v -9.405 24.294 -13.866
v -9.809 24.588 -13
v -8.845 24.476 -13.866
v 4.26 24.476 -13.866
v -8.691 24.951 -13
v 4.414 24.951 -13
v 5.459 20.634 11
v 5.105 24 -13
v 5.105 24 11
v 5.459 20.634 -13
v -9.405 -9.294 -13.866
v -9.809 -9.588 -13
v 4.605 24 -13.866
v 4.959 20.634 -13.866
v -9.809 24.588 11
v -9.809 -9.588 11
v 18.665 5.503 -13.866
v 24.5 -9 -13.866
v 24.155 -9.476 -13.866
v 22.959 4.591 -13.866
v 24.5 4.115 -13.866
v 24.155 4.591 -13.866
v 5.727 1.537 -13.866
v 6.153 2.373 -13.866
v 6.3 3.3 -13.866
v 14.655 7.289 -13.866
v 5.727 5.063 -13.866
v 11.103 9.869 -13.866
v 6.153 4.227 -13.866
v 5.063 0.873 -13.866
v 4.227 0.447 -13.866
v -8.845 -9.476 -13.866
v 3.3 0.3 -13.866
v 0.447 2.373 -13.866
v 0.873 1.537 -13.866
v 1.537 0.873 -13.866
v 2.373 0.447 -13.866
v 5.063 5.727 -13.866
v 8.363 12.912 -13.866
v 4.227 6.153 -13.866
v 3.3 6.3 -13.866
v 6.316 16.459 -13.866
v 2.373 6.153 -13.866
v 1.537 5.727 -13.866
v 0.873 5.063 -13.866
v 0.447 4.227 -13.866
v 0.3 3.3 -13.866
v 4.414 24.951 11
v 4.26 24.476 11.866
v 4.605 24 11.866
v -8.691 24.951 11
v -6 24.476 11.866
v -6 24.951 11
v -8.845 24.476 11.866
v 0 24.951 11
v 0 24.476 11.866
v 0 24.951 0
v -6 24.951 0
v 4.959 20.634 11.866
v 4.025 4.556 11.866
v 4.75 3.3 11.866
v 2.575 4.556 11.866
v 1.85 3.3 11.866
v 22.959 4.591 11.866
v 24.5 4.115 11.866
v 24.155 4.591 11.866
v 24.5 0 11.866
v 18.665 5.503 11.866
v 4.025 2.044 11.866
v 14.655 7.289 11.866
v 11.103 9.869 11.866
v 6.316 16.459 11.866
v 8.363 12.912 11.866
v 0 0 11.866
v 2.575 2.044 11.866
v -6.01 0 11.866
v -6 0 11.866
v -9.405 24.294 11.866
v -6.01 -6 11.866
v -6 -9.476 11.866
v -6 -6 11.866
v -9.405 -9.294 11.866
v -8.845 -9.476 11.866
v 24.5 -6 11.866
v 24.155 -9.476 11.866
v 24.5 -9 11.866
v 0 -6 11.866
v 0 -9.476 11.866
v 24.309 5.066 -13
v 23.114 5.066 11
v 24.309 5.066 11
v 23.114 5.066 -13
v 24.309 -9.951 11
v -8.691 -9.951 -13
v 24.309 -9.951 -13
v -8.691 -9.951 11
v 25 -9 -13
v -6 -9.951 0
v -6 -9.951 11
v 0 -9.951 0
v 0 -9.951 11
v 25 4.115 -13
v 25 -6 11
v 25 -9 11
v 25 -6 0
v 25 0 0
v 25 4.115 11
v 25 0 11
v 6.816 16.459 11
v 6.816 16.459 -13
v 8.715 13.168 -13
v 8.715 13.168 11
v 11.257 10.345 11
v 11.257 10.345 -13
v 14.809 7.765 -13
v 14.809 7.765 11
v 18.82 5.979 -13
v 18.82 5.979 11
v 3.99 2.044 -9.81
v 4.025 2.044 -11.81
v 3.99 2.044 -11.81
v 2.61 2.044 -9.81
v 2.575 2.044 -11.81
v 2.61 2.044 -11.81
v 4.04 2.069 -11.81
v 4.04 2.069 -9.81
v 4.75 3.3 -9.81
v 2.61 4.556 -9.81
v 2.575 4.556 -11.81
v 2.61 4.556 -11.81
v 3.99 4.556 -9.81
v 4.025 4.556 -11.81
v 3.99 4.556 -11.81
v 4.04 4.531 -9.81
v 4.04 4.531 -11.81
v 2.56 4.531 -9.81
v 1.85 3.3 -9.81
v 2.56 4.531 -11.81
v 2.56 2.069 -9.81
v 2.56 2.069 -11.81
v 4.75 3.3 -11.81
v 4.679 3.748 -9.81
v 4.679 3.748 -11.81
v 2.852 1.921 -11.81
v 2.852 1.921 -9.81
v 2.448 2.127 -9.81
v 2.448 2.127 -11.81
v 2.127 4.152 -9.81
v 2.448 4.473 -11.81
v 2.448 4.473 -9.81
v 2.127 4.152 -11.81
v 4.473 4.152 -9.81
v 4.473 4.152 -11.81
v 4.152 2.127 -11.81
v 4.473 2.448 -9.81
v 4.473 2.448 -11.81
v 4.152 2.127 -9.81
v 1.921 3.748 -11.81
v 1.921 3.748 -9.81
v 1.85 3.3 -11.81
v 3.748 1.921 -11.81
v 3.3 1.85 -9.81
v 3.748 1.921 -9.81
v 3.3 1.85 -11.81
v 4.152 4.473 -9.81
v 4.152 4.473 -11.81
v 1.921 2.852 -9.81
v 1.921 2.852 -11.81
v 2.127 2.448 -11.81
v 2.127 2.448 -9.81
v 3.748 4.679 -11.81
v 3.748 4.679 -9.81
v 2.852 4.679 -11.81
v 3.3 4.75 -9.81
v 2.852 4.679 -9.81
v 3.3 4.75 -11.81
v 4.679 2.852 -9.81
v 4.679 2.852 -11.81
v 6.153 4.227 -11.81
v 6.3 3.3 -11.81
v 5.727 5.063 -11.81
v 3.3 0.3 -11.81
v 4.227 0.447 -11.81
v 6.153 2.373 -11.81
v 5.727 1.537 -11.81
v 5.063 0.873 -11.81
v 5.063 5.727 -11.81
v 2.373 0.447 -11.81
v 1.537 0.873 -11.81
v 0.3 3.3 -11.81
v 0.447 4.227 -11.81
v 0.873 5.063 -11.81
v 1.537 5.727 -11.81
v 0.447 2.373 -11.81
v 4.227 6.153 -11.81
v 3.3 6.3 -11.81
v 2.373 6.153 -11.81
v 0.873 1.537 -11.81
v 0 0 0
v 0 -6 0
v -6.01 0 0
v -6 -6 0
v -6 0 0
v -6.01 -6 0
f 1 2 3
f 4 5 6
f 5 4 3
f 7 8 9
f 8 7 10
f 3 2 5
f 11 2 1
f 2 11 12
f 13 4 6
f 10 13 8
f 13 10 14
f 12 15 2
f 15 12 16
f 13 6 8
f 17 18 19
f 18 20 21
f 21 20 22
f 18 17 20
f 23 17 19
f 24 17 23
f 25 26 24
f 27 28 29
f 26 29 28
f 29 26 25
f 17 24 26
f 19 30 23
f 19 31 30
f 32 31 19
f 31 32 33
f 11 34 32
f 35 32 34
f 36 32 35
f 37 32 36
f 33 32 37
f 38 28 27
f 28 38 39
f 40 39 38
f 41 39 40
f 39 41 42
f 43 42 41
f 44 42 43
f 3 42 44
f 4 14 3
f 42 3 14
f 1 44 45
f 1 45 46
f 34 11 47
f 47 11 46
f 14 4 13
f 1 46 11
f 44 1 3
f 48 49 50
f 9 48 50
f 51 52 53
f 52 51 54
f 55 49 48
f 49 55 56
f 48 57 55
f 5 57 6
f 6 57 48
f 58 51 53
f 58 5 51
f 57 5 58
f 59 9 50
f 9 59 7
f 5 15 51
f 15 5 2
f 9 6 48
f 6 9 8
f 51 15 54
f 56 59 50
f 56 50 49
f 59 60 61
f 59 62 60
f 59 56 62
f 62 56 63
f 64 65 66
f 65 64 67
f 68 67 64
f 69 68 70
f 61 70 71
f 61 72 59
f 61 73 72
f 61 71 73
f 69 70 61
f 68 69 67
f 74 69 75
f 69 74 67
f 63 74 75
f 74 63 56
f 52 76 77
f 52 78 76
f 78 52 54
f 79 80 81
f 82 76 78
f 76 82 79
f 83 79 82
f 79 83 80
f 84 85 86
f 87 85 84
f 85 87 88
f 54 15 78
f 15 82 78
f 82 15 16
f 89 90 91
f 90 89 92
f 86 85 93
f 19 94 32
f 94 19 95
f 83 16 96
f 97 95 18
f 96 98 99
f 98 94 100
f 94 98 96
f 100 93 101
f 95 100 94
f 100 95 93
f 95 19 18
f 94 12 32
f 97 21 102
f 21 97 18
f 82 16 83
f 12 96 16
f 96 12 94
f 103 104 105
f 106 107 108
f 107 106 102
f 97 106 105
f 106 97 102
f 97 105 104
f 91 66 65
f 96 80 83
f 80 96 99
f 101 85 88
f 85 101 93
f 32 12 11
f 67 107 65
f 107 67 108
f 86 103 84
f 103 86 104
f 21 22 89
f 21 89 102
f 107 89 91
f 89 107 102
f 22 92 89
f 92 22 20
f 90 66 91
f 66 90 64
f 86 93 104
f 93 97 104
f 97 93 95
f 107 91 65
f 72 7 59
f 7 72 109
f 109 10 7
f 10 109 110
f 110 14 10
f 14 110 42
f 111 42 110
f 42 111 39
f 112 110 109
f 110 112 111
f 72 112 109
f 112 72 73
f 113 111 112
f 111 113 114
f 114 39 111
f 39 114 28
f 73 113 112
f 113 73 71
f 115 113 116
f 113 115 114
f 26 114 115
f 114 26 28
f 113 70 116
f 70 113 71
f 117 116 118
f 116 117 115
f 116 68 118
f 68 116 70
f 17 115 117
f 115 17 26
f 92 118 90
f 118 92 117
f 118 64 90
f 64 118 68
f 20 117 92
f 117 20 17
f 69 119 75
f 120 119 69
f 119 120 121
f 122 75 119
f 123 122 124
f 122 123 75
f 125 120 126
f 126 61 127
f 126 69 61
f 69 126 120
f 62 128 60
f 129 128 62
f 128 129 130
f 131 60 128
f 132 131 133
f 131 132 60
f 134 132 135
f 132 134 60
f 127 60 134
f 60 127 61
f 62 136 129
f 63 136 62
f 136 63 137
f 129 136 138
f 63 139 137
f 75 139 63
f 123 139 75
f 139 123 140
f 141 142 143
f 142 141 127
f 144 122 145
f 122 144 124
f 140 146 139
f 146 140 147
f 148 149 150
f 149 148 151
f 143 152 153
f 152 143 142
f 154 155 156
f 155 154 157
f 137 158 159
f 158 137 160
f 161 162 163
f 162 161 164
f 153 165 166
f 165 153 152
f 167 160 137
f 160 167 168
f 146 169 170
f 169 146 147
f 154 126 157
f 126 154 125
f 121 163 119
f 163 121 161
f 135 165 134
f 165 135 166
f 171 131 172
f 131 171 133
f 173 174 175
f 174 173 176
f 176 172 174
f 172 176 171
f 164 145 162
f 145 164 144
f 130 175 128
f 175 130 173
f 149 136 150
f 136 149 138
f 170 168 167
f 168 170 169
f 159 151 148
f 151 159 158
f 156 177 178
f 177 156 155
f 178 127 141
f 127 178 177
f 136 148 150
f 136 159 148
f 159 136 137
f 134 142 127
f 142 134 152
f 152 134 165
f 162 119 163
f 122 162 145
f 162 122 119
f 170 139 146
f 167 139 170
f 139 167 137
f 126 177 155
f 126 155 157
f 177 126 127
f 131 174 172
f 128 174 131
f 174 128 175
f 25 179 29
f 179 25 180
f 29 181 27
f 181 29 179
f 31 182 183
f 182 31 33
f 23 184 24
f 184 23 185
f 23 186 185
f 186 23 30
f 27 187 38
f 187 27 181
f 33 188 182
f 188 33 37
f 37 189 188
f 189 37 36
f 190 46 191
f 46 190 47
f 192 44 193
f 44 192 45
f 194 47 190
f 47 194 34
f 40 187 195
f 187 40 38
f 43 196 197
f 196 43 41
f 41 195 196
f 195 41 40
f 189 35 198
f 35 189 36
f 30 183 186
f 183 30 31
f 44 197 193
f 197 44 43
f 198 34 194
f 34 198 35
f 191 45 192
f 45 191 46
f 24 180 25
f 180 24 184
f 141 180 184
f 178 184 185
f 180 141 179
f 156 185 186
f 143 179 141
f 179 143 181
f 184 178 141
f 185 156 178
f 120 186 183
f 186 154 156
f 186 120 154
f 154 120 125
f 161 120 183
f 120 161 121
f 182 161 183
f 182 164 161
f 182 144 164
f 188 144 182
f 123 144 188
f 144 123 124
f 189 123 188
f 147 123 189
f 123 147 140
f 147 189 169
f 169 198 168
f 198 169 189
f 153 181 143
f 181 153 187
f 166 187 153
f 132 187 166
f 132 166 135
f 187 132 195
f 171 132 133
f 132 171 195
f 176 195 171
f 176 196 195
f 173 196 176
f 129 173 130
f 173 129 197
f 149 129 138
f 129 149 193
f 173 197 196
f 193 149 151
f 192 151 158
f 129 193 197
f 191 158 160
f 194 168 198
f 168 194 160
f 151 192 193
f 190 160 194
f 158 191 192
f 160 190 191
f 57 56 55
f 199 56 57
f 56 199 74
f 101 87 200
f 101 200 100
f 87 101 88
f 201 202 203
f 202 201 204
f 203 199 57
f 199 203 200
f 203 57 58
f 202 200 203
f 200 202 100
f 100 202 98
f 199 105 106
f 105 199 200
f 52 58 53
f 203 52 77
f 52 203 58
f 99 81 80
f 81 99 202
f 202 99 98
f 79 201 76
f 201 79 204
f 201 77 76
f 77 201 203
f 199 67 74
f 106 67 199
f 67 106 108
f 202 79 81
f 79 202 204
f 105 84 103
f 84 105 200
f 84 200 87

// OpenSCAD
// [FL_INDEX: keywords="openscad, 3d_parametric, Customizable__ultimaker_foot__hence__feet_also, csg_solid" | COT="Parametric OpenSCAD design from 3DCodeverse"]
// Title: Customizable: ultimaker foot (hence, feet also)

// The real added height
bottomHeight=14;

// Internal height (snug fit)
internalHeight=12;

// Rounded corner radius
roundness=1;

// How big is the thing in the horizontal plane
cubeSide= 25;

// Wall thickness
outSide= 4;

// Plywood thickness
plyWidth= 6;



// This is rev 2 for thingiverse customizer
// MoonCactus / jeremie.francois@gmail.com / betterprinter.blogspot.com

// The screw data match a standard UM spare
screwDiameter=2.9+0;
screwDistToWalls=0.8+0;
screwHeadDiameter=6+0;
screwHeadDepth=2.2+0;

tol=0.01+0;

translate([-plyWidth-outSide,-plyWidth-outSide,0])
{
	difference()
	{

		minkowski()
		{
			sphere(r=1); // round the main body shape
			difference()
			{

				// Main body
				translate([roundness,roundness,-bottomHeight+roundness])
					cube([cubeSide + plyWidth + outSide -roundness*2, cubeSide + plyWidth + outSide -roundness*2, internalHeight+bottomHeight -roundness*2]);
				// Main cylinder removal
				translate([cubeSide + plyWidth + outSide, cubeSide + plyWidth + outSide,-bottomHeight+roundness-tol])
					cylinder(r=cubeSide-outSide, h=internalHeight+bottomHeight-roundness*2+tol*2);
			}
		}

		// The two grooves (one of them being blind on one side)
		translate([outSide,-tol,0]) cube([plyWidth, cubeSide+plyWidth+outSide+tol*2, internalHeight+tol]);
		translate([-tol+outSide,outSide,0]) cube([cubeSide+plyWidth+tol*2, plyWidth, internalHeight+tol]);

		// Hole for a screw to attach a rubber pad AND to pushes the feet wals against that of the UM for stickier fit
		translate([cubeSide/2+screwDistToWalls, cubeSide/2+screwDistToWalls,-bottomHeight-tol])
		{
			cylinder(r=screwDiameter/2, h=internalHeight+bottomHeight+tol*2, $fn=6);
			cylinder(r=screwDiameter/2, h=screwHeadDepth+2, $fn=20); // 2 easy millimeters to facilitate screwing the screw 
			cylinder(r=screwHeadDiameter/2, h=screwHeadDepth, $fn=20);
		}		


	}
}
